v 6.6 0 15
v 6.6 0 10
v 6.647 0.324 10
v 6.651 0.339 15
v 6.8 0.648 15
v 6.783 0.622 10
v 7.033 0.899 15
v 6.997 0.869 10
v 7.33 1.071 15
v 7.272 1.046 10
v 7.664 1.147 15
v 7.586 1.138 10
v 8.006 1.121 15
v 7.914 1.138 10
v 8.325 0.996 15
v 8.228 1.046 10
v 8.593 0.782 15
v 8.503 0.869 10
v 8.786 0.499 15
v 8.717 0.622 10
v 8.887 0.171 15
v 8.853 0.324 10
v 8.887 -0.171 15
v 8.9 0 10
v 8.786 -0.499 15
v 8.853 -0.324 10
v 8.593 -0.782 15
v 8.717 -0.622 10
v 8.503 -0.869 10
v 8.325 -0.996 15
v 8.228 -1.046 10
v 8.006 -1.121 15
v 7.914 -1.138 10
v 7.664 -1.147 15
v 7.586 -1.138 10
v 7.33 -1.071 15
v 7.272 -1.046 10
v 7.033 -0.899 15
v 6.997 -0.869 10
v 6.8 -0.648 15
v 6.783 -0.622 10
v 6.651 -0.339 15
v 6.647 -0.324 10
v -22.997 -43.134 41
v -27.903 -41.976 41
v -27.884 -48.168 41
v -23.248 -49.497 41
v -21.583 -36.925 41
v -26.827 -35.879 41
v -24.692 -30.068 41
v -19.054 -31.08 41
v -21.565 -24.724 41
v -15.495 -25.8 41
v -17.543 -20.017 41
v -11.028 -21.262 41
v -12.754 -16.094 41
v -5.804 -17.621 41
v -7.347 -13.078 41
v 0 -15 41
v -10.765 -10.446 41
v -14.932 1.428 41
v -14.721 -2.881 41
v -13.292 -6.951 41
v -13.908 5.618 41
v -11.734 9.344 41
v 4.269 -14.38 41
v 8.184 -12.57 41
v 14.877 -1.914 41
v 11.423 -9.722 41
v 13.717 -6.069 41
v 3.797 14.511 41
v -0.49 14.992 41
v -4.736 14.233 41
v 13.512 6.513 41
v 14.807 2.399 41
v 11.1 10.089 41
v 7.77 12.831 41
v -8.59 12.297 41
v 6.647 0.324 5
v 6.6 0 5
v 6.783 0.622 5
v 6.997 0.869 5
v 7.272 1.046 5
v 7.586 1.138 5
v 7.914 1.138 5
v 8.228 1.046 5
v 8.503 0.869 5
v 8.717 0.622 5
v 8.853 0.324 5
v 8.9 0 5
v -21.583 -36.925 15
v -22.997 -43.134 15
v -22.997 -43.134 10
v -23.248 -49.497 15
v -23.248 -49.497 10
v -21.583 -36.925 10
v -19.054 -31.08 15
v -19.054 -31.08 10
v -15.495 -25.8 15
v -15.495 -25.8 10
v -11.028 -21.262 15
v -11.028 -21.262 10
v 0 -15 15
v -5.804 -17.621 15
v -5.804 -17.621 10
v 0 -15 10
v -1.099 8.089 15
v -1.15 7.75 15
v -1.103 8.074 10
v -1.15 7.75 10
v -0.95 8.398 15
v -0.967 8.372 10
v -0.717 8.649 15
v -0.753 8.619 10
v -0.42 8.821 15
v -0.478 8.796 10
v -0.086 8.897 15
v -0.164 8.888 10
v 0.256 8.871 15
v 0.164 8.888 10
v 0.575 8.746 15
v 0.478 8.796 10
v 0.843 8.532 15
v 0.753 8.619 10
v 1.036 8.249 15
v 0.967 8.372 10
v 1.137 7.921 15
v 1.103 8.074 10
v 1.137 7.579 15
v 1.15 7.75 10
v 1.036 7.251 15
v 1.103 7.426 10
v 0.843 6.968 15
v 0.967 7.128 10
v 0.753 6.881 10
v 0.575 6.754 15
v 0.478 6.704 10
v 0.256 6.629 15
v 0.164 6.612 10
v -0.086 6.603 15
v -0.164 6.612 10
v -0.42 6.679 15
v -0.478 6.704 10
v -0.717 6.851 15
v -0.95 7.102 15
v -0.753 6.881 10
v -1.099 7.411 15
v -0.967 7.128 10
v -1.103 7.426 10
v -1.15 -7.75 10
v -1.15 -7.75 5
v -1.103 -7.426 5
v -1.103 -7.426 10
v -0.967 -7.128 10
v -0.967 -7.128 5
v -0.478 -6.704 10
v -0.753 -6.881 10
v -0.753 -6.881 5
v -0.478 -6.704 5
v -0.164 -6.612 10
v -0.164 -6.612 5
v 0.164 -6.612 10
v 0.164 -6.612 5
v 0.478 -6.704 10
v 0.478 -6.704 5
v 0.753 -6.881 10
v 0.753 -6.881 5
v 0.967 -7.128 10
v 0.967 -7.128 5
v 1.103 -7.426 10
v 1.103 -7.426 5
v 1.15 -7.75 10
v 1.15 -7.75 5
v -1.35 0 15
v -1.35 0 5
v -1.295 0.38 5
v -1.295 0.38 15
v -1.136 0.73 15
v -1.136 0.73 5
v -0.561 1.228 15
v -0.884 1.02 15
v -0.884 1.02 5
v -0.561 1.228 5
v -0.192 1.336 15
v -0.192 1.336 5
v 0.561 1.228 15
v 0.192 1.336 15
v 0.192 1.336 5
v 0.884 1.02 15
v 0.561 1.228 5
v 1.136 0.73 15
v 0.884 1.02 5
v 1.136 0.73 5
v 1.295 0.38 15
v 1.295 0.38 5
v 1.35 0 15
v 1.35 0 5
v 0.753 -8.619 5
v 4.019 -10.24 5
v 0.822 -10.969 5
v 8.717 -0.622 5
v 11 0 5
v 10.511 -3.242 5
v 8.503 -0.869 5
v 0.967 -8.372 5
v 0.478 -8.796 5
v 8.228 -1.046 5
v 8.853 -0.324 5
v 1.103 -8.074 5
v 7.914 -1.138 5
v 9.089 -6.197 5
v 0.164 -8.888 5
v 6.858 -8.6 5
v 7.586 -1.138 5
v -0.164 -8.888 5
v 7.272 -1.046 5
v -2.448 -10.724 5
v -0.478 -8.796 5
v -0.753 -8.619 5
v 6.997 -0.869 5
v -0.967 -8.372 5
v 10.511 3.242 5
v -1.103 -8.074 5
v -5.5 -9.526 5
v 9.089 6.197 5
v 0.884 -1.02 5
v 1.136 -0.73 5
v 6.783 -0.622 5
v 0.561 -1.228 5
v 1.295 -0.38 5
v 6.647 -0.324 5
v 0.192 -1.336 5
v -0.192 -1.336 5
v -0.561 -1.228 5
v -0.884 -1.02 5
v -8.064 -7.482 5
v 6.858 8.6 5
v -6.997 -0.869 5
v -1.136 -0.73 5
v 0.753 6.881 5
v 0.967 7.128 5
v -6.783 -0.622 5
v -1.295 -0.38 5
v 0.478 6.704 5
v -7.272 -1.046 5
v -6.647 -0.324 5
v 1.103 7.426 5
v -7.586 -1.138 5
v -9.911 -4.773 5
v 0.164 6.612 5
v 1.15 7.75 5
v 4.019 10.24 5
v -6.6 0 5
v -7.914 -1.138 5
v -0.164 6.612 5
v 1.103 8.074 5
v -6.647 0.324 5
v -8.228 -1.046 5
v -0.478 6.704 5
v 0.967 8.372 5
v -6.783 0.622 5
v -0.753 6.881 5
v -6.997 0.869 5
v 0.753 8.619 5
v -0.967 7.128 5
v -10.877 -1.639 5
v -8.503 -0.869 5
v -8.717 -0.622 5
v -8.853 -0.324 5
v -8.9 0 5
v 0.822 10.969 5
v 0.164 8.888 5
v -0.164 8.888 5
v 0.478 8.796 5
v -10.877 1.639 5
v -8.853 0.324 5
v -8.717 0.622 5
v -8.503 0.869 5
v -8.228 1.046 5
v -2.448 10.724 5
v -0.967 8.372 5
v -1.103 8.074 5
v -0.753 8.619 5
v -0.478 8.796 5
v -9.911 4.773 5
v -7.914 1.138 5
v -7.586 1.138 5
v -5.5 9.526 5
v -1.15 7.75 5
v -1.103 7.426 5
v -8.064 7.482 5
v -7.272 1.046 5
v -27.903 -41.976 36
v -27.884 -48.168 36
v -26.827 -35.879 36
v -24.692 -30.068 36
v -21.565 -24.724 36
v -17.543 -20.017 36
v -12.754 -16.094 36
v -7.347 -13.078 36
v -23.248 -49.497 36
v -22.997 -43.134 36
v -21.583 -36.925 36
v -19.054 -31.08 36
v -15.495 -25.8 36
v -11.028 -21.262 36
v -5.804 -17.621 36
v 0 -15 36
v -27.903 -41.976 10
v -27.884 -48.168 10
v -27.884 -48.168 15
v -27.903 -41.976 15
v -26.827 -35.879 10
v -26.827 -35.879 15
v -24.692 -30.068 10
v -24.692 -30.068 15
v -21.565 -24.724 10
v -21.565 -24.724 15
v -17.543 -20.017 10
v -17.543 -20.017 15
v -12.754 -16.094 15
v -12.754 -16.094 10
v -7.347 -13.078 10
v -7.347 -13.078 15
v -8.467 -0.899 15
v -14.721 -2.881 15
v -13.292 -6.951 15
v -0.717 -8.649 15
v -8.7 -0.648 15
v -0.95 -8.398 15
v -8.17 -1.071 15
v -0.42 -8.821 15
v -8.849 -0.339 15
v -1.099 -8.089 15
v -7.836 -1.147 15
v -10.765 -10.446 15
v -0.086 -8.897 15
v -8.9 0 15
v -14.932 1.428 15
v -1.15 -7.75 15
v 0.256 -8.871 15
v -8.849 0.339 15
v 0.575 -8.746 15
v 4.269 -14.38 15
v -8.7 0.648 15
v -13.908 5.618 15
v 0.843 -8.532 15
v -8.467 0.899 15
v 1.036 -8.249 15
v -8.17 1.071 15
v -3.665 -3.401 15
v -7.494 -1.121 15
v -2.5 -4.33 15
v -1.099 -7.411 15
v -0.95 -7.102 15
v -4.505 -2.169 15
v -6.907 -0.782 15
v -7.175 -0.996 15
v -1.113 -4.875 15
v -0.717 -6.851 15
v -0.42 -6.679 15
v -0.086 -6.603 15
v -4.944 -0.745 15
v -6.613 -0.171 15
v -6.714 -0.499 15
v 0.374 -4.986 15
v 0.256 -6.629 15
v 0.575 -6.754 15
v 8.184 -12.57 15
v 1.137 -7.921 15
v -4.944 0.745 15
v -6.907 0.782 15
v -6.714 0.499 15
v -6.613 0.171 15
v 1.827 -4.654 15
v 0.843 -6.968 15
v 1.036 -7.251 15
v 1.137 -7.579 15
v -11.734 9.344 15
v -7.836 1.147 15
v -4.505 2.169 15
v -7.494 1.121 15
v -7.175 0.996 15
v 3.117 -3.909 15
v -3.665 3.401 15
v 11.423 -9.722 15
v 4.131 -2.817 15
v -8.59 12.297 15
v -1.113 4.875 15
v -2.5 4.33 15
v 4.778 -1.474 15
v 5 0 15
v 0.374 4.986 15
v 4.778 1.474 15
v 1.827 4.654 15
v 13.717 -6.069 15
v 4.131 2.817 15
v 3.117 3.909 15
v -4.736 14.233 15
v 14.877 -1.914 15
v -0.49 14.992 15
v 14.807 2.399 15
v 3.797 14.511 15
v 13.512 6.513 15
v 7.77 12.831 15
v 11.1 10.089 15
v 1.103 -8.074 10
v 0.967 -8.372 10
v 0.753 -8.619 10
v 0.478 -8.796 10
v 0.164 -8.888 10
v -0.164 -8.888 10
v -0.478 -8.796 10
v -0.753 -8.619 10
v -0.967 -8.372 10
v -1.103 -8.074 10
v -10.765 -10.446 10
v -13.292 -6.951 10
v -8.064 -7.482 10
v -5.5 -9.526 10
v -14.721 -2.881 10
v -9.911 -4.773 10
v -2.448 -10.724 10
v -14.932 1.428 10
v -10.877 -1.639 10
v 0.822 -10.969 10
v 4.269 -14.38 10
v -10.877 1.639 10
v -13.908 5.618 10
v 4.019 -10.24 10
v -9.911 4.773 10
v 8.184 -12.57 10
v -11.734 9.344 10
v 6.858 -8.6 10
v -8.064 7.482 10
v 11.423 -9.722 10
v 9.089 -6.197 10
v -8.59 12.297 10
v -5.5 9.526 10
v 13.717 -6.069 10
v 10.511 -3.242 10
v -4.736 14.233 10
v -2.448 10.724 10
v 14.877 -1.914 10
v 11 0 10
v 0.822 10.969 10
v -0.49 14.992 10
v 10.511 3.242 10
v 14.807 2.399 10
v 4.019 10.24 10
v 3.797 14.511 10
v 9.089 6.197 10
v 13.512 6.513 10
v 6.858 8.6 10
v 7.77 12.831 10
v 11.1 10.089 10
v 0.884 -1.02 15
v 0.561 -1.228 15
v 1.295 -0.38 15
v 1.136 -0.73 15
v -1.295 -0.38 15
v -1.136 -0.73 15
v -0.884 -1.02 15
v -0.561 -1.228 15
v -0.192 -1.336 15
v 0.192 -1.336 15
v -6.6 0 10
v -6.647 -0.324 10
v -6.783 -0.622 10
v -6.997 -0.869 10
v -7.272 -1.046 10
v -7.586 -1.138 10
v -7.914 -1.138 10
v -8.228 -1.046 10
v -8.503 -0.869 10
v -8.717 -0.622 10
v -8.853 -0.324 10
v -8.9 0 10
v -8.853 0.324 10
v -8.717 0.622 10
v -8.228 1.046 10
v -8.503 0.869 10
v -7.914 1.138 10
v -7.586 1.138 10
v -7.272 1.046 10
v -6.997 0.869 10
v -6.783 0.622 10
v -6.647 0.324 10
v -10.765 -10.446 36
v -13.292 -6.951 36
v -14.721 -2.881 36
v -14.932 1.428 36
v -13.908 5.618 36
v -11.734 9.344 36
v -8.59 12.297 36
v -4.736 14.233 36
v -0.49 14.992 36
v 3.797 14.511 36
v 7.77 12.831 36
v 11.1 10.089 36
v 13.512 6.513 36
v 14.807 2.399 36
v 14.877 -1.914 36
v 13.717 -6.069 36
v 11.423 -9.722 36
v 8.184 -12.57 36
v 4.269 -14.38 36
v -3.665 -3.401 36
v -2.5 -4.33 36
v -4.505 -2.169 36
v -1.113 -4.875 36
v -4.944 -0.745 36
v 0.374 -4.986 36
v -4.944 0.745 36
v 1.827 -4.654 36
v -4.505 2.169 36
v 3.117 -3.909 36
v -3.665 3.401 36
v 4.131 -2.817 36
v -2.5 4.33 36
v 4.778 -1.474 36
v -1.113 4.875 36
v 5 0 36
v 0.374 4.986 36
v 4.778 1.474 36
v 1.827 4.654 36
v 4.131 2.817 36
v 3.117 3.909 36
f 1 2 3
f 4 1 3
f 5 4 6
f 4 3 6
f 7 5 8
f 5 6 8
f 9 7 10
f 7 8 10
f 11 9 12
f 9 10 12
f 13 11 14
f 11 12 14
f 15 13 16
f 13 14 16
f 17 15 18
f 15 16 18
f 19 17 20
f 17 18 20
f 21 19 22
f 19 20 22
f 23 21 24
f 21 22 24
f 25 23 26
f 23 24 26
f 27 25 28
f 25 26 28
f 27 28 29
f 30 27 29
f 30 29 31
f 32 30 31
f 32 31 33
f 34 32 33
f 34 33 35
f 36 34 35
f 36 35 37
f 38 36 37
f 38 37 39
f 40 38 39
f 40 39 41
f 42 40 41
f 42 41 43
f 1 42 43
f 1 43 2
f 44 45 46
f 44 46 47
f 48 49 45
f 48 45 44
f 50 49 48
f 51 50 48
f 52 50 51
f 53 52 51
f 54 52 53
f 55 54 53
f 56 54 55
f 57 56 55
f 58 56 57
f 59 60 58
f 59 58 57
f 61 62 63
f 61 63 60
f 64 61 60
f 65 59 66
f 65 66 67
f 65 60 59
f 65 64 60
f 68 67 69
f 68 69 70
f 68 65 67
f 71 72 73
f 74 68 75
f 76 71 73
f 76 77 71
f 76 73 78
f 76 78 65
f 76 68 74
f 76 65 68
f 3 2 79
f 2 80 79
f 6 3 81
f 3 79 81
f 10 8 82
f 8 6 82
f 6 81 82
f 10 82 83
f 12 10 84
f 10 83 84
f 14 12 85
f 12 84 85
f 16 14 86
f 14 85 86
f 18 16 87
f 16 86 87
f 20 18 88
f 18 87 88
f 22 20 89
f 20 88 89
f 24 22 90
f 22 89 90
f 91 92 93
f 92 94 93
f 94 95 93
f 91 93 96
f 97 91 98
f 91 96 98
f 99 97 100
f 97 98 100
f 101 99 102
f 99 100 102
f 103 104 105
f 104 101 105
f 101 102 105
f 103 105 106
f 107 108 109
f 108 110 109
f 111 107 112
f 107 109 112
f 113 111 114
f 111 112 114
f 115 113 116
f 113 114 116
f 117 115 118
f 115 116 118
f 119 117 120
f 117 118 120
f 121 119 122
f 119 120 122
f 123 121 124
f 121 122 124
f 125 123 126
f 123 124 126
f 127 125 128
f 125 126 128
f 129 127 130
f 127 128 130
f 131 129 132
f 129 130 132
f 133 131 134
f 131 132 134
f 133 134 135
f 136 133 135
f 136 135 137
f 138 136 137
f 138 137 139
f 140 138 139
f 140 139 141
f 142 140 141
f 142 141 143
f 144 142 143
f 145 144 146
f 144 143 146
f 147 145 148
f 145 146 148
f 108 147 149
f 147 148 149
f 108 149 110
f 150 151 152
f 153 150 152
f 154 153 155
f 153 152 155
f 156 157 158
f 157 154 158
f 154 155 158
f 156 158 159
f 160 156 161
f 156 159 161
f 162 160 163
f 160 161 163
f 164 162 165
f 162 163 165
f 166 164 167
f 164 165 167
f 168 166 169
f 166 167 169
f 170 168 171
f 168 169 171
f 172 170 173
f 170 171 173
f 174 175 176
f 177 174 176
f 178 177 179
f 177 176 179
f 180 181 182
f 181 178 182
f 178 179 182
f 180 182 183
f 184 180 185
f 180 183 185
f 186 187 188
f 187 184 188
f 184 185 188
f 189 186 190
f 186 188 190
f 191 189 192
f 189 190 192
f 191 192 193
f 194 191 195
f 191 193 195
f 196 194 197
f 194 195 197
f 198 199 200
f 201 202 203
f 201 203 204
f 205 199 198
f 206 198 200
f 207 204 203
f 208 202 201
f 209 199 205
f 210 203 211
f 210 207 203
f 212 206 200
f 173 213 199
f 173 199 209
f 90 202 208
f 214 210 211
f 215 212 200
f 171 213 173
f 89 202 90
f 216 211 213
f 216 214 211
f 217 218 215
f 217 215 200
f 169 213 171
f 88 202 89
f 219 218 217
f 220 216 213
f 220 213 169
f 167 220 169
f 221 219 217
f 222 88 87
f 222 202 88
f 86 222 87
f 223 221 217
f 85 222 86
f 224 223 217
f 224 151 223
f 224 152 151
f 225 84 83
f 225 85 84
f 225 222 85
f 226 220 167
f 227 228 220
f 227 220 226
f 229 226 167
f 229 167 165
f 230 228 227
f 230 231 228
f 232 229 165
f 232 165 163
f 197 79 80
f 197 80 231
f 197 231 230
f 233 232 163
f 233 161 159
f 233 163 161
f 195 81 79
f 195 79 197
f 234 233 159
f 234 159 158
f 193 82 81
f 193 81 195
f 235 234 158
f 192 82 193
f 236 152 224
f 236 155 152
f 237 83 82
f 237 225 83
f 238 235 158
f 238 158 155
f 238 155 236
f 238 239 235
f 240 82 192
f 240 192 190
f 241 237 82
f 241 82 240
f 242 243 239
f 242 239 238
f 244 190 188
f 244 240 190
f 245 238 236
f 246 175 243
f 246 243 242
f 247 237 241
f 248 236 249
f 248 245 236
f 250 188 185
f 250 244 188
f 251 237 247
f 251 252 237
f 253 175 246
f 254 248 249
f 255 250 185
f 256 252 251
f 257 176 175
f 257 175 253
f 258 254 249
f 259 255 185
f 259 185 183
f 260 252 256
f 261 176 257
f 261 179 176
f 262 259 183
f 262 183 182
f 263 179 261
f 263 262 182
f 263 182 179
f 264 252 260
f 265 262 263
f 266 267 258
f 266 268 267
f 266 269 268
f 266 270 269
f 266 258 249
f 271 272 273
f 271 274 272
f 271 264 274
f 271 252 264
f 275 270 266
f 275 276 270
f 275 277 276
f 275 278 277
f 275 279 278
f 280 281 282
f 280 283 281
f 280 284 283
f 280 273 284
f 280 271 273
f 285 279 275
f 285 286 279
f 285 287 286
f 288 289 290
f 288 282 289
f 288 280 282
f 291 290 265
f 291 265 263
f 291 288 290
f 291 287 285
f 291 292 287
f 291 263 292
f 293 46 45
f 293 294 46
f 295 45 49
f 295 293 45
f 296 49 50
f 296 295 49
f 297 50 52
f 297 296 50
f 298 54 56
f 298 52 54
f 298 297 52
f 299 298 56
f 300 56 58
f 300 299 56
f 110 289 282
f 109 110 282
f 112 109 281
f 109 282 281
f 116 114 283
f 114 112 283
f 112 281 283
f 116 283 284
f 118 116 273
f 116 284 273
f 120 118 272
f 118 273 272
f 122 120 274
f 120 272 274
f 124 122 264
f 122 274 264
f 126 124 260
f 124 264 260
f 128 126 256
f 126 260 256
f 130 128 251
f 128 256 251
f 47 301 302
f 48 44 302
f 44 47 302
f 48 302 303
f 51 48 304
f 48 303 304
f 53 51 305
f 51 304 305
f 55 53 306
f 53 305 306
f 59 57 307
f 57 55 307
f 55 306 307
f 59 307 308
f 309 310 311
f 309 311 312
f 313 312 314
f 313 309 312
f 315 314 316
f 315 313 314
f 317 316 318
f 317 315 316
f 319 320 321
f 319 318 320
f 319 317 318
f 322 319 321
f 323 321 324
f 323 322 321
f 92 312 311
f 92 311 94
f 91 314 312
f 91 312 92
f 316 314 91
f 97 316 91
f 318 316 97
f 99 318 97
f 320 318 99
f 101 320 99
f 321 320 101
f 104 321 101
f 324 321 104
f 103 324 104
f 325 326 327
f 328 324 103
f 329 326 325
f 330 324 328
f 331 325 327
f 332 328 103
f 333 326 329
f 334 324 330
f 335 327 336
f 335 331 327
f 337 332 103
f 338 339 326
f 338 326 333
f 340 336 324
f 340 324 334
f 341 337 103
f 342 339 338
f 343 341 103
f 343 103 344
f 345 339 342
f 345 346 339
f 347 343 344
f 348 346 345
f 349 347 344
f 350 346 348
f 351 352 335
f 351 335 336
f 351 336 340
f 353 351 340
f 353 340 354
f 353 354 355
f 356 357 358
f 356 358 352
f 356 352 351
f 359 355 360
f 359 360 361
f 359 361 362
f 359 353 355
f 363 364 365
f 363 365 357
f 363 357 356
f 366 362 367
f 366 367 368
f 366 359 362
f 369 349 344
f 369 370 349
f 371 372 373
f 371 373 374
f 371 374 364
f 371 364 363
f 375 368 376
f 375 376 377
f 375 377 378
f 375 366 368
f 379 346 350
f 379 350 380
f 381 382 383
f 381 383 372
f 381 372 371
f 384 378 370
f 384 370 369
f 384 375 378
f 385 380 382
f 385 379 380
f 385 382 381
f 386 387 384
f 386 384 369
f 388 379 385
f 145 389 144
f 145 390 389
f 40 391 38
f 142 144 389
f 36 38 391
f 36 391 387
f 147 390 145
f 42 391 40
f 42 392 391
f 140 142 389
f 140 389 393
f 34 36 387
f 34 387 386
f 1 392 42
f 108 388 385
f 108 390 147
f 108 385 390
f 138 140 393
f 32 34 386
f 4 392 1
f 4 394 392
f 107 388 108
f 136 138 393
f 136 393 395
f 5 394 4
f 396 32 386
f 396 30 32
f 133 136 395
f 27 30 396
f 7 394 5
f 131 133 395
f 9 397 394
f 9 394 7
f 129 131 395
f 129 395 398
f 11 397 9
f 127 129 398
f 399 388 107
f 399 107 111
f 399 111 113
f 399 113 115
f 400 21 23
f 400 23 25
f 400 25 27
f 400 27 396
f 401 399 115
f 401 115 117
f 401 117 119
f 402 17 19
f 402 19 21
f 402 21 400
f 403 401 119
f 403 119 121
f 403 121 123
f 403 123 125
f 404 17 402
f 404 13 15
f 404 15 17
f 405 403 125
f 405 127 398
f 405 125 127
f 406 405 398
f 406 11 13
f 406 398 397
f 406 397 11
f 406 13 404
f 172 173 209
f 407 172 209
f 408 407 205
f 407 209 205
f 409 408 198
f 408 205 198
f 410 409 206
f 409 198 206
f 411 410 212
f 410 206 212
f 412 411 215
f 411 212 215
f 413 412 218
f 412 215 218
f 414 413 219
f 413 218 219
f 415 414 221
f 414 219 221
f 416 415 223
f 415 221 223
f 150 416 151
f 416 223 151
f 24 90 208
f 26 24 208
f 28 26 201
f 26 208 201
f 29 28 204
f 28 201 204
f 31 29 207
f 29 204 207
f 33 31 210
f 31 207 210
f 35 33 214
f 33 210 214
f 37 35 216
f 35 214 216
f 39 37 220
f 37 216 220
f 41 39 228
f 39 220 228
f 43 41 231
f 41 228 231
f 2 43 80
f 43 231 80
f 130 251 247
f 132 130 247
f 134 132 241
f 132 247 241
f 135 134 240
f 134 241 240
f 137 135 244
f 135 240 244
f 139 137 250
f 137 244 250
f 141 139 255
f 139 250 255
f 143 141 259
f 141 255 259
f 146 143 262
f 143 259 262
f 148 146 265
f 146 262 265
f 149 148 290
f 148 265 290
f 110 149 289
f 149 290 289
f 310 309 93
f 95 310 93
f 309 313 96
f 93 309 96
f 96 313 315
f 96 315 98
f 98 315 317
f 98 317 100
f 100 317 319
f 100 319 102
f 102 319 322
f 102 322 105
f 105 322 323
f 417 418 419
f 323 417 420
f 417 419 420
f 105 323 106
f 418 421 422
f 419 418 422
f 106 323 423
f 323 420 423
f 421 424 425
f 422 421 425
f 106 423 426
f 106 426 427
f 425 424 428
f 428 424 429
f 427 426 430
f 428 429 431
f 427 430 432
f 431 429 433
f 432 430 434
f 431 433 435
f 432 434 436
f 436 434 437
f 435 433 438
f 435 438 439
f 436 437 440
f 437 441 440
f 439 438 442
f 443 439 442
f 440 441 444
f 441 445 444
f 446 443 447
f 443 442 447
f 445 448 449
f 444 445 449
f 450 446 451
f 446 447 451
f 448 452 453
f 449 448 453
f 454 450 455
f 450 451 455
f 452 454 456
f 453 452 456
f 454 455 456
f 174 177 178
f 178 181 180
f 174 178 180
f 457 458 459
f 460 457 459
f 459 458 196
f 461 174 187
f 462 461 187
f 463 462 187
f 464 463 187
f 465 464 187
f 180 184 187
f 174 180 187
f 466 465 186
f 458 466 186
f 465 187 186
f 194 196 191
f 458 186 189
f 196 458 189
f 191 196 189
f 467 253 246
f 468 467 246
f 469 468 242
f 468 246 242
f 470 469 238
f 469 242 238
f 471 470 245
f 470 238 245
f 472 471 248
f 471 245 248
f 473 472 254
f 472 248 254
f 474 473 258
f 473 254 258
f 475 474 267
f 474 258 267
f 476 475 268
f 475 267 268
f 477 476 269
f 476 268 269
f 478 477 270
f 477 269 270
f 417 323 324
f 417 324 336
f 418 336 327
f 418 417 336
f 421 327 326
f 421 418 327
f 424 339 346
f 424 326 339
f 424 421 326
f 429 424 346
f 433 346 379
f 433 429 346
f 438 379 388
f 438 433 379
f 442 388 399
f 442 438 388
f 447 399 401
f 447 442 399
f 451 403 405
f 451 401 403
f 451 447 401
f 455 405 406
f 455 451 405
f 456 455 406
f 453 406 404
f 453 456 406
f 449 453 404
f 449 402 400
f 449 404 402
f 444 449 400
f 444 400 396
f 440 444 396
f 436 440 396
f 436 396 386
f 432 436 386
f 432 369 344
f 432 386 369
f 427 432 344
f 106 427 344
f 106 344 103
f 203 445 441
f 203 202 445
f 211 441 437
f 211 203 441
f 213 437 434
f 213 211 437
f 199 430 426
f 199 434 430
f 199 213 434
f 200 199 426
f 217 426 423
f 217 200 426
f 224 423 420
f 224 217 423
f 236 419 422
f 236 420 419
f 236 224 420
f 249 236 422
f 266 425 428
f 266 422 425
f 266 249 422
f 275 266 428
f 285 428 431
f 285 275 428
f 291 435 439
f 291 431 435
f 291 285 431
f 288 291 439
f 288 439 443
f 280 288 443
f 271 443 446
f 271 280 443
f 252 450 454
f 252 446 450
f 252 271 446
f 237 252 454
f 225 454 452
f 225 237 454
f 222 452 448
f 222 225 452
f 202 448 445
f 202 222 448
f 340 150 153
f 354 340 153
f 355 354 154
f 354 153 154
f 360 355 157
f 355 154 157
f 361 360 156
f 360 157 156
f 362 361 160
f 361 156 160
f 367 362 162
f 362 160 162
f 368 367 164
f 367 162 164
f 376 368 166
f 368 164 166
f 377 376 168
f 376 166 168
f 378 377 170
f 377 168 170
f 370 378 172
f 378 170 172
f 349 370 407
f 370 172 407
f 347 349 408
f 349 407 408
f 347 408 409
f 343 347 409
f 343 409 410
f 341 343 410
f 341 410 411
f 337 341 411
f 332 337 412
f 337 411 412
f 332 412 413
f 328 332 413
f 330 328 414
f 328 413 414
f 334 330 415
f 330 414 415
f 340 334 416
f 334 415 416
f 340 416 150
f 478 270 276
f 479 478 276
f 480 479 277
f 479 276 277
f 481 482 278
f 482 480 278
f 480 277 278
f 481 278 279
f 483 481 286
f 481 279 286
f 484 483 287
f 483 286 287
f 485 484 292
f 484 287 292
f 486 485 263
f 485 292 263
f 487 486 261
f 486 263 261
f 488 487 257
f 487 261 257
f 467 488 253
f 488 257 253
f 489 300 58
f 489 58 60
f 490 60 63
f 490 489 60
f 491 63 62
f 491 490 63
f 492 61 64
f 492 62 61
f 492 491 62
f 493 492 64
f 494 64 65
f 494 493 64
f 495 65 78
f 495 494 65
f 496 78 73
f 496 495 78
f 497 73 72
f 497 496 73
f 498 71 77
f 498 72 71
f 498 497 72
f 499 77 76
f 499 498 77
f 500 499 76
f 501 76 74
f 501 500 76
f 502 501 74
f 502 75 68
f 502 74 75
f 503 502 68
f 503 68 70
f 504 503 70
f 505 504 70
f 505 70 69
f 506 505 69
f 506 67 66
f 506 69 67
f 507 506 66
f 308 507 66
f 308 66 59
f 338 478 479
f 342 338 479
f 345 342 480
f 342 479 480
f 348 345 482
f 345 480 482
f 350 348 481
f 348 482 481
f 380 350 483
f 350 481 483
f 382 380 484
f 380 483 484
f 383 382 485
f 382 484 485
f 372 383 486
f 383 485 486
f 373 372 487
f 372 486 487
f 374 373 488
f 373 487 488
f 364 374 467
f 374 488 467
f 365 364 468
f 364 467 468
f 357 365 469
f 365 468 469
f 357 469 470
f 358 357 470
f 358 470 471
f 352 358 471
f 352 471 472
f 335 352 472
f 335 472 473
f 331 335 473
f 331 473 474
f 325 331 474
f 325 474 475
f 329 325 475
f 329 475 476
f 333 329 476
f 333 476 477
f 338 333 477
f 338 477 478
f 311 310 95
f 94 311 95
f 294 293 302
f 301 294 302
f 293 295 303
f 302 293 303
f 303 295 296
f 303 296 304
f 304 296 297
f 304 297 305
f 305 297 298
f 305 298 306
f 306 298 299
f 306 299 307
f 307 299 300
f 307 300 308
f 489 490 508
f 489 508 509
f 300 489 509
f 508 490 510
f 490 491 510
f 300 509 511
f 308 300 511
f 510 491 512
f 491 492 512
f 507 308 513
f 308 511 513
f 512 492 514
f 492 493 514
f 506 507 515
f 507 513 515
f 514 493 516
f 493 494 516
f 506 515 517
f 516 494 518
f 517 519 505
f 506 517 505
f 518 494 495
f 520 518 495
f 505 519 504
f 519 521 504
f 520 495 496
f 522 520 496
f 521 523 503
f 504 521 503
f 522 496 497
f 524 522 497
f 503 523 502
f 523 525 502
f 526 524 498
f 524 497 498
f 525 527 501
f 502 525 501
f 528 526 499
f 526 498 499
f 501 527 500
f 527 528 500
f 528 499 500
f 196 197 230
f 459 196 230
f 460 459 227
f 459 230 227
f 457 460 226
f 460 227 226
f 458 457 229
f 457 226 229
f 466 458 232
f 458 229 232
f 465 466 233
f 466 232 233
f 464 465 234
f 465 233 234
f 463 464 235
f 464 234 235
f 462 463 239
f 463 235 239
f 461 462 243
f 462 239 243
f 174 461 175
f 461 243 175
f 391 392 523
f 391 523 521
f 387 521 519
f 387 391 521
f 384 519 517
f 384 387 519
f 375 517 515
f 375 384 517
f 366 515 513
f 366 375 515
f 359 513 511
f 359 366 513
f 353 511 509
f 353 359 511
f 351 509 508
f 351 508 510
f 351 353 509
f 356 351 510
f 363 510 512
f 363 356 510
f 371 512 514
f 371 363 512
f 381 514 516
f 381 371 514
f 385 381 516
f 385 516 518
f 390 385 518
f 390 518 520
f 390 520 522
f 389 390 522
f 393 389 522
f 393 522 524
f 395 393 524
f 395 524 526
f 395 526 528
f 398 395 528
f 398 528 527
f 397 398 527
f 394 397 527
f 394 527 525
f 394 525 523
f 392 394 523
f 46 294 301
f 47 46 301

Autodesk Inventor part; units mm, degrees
ref_plane "YZ Plane" through (0, 0, 0) normal (1, 0, 0) x (0, 1, 0)
ref_plane "XZ Plane" through (0, 0, 0) normal (0, 1, 0) x (-1, 0, 0)
ref_plane "XY Plane" through (0, 0, 0) normal (0, 0, 1) x (1, 0, 0)
sketch "Esquisse1" plane through (0, 0, 0) normal (0, 0, 1) x (1, 0, 0)
  circle A0 centre (0, 0) radius 1.35
  circle A1 centre (0, -7.75) radius 1.15
  circle A2 centre (7.75, 0) radius 1.15
  circle A3 centre (0, 7.75) radius 1.15
  circle A4 centre (-7.75, 0) radius 1.15
  circle A5 centre (0, 0) radius 11
extrude "Extrusion1" add sketch "Esquisse1" along normal blind 10
sketch "Esquisse3" plane through (0, 0, 10) normal (0, 0, 1) x (1, 0, 0)
  circle A0 centre (0, 0) radius 1.35 projected
  arc A1 (0, -15) -> (-7.3469, -13.0776) centre (0, 0) ccw
  arc A2 (-7.3469, -13.0776) -> (-27.8845, -48.1677) centre (6.8982, -44.9701) ccw
  arc A3 (0, -15) -> (-23.2475, -49.4967) centre (11.2565, -47.6674) ccw
  line L0 (-27.8845, -48.1677) -> (-23.2475, -49.4967)
  dimension "d28" = 30
extrude "Extrusion3" add sketch "Esquisse3" along normal blind 5
sketch "Esquisse4" plane through (0, 0, 0) normal (0, 0, -1) x (-1, 0, 0)
  circle A0 centre (0, 0) radius 1.35 projected
  circle A1 centre (7.75, 0) radius 1.15 projected
  circle A2 centre (0, 7.75) radius 1.15 projected
  circle A3 centre (-7.75, 0) radius 1.15 projected
  circle A4 centre (0, -7.75) radius 1.15 projected
  circle A5 centre (0, 0) radius 11 projected
extrude "Extrusion4" cut sketch "Esquisse4" against normal blind 46.25 contours A0 | A1 | A2 | A3 | A4
sketch "Esquisse5" plane through (0, 0, 15) normal (0, 0, 1) x (1, 0, 0)
  circle A0 centre (0, 0) radius 5
  dimension "d33" = 10
extrude "Extrusion5" add sketch "Esquisse5" along normal blind 26
pattern_linear "Réseau rectangulaire1" count 2 spacing 26 along (0, 0, 1) of "Extrusion3"
sketch "Esquisse6" plane through (0, 0, 0) normal (0, 0, -1) x (-1, 0, 0)
  circle A0 centre (0, 0) radius 1.35 projected
  circle A1 centre (0, 0) radius 11
extrude "Extrusion6" cut sketch "Esquisse6" against normal blind 5
properties part number "carroussel"
